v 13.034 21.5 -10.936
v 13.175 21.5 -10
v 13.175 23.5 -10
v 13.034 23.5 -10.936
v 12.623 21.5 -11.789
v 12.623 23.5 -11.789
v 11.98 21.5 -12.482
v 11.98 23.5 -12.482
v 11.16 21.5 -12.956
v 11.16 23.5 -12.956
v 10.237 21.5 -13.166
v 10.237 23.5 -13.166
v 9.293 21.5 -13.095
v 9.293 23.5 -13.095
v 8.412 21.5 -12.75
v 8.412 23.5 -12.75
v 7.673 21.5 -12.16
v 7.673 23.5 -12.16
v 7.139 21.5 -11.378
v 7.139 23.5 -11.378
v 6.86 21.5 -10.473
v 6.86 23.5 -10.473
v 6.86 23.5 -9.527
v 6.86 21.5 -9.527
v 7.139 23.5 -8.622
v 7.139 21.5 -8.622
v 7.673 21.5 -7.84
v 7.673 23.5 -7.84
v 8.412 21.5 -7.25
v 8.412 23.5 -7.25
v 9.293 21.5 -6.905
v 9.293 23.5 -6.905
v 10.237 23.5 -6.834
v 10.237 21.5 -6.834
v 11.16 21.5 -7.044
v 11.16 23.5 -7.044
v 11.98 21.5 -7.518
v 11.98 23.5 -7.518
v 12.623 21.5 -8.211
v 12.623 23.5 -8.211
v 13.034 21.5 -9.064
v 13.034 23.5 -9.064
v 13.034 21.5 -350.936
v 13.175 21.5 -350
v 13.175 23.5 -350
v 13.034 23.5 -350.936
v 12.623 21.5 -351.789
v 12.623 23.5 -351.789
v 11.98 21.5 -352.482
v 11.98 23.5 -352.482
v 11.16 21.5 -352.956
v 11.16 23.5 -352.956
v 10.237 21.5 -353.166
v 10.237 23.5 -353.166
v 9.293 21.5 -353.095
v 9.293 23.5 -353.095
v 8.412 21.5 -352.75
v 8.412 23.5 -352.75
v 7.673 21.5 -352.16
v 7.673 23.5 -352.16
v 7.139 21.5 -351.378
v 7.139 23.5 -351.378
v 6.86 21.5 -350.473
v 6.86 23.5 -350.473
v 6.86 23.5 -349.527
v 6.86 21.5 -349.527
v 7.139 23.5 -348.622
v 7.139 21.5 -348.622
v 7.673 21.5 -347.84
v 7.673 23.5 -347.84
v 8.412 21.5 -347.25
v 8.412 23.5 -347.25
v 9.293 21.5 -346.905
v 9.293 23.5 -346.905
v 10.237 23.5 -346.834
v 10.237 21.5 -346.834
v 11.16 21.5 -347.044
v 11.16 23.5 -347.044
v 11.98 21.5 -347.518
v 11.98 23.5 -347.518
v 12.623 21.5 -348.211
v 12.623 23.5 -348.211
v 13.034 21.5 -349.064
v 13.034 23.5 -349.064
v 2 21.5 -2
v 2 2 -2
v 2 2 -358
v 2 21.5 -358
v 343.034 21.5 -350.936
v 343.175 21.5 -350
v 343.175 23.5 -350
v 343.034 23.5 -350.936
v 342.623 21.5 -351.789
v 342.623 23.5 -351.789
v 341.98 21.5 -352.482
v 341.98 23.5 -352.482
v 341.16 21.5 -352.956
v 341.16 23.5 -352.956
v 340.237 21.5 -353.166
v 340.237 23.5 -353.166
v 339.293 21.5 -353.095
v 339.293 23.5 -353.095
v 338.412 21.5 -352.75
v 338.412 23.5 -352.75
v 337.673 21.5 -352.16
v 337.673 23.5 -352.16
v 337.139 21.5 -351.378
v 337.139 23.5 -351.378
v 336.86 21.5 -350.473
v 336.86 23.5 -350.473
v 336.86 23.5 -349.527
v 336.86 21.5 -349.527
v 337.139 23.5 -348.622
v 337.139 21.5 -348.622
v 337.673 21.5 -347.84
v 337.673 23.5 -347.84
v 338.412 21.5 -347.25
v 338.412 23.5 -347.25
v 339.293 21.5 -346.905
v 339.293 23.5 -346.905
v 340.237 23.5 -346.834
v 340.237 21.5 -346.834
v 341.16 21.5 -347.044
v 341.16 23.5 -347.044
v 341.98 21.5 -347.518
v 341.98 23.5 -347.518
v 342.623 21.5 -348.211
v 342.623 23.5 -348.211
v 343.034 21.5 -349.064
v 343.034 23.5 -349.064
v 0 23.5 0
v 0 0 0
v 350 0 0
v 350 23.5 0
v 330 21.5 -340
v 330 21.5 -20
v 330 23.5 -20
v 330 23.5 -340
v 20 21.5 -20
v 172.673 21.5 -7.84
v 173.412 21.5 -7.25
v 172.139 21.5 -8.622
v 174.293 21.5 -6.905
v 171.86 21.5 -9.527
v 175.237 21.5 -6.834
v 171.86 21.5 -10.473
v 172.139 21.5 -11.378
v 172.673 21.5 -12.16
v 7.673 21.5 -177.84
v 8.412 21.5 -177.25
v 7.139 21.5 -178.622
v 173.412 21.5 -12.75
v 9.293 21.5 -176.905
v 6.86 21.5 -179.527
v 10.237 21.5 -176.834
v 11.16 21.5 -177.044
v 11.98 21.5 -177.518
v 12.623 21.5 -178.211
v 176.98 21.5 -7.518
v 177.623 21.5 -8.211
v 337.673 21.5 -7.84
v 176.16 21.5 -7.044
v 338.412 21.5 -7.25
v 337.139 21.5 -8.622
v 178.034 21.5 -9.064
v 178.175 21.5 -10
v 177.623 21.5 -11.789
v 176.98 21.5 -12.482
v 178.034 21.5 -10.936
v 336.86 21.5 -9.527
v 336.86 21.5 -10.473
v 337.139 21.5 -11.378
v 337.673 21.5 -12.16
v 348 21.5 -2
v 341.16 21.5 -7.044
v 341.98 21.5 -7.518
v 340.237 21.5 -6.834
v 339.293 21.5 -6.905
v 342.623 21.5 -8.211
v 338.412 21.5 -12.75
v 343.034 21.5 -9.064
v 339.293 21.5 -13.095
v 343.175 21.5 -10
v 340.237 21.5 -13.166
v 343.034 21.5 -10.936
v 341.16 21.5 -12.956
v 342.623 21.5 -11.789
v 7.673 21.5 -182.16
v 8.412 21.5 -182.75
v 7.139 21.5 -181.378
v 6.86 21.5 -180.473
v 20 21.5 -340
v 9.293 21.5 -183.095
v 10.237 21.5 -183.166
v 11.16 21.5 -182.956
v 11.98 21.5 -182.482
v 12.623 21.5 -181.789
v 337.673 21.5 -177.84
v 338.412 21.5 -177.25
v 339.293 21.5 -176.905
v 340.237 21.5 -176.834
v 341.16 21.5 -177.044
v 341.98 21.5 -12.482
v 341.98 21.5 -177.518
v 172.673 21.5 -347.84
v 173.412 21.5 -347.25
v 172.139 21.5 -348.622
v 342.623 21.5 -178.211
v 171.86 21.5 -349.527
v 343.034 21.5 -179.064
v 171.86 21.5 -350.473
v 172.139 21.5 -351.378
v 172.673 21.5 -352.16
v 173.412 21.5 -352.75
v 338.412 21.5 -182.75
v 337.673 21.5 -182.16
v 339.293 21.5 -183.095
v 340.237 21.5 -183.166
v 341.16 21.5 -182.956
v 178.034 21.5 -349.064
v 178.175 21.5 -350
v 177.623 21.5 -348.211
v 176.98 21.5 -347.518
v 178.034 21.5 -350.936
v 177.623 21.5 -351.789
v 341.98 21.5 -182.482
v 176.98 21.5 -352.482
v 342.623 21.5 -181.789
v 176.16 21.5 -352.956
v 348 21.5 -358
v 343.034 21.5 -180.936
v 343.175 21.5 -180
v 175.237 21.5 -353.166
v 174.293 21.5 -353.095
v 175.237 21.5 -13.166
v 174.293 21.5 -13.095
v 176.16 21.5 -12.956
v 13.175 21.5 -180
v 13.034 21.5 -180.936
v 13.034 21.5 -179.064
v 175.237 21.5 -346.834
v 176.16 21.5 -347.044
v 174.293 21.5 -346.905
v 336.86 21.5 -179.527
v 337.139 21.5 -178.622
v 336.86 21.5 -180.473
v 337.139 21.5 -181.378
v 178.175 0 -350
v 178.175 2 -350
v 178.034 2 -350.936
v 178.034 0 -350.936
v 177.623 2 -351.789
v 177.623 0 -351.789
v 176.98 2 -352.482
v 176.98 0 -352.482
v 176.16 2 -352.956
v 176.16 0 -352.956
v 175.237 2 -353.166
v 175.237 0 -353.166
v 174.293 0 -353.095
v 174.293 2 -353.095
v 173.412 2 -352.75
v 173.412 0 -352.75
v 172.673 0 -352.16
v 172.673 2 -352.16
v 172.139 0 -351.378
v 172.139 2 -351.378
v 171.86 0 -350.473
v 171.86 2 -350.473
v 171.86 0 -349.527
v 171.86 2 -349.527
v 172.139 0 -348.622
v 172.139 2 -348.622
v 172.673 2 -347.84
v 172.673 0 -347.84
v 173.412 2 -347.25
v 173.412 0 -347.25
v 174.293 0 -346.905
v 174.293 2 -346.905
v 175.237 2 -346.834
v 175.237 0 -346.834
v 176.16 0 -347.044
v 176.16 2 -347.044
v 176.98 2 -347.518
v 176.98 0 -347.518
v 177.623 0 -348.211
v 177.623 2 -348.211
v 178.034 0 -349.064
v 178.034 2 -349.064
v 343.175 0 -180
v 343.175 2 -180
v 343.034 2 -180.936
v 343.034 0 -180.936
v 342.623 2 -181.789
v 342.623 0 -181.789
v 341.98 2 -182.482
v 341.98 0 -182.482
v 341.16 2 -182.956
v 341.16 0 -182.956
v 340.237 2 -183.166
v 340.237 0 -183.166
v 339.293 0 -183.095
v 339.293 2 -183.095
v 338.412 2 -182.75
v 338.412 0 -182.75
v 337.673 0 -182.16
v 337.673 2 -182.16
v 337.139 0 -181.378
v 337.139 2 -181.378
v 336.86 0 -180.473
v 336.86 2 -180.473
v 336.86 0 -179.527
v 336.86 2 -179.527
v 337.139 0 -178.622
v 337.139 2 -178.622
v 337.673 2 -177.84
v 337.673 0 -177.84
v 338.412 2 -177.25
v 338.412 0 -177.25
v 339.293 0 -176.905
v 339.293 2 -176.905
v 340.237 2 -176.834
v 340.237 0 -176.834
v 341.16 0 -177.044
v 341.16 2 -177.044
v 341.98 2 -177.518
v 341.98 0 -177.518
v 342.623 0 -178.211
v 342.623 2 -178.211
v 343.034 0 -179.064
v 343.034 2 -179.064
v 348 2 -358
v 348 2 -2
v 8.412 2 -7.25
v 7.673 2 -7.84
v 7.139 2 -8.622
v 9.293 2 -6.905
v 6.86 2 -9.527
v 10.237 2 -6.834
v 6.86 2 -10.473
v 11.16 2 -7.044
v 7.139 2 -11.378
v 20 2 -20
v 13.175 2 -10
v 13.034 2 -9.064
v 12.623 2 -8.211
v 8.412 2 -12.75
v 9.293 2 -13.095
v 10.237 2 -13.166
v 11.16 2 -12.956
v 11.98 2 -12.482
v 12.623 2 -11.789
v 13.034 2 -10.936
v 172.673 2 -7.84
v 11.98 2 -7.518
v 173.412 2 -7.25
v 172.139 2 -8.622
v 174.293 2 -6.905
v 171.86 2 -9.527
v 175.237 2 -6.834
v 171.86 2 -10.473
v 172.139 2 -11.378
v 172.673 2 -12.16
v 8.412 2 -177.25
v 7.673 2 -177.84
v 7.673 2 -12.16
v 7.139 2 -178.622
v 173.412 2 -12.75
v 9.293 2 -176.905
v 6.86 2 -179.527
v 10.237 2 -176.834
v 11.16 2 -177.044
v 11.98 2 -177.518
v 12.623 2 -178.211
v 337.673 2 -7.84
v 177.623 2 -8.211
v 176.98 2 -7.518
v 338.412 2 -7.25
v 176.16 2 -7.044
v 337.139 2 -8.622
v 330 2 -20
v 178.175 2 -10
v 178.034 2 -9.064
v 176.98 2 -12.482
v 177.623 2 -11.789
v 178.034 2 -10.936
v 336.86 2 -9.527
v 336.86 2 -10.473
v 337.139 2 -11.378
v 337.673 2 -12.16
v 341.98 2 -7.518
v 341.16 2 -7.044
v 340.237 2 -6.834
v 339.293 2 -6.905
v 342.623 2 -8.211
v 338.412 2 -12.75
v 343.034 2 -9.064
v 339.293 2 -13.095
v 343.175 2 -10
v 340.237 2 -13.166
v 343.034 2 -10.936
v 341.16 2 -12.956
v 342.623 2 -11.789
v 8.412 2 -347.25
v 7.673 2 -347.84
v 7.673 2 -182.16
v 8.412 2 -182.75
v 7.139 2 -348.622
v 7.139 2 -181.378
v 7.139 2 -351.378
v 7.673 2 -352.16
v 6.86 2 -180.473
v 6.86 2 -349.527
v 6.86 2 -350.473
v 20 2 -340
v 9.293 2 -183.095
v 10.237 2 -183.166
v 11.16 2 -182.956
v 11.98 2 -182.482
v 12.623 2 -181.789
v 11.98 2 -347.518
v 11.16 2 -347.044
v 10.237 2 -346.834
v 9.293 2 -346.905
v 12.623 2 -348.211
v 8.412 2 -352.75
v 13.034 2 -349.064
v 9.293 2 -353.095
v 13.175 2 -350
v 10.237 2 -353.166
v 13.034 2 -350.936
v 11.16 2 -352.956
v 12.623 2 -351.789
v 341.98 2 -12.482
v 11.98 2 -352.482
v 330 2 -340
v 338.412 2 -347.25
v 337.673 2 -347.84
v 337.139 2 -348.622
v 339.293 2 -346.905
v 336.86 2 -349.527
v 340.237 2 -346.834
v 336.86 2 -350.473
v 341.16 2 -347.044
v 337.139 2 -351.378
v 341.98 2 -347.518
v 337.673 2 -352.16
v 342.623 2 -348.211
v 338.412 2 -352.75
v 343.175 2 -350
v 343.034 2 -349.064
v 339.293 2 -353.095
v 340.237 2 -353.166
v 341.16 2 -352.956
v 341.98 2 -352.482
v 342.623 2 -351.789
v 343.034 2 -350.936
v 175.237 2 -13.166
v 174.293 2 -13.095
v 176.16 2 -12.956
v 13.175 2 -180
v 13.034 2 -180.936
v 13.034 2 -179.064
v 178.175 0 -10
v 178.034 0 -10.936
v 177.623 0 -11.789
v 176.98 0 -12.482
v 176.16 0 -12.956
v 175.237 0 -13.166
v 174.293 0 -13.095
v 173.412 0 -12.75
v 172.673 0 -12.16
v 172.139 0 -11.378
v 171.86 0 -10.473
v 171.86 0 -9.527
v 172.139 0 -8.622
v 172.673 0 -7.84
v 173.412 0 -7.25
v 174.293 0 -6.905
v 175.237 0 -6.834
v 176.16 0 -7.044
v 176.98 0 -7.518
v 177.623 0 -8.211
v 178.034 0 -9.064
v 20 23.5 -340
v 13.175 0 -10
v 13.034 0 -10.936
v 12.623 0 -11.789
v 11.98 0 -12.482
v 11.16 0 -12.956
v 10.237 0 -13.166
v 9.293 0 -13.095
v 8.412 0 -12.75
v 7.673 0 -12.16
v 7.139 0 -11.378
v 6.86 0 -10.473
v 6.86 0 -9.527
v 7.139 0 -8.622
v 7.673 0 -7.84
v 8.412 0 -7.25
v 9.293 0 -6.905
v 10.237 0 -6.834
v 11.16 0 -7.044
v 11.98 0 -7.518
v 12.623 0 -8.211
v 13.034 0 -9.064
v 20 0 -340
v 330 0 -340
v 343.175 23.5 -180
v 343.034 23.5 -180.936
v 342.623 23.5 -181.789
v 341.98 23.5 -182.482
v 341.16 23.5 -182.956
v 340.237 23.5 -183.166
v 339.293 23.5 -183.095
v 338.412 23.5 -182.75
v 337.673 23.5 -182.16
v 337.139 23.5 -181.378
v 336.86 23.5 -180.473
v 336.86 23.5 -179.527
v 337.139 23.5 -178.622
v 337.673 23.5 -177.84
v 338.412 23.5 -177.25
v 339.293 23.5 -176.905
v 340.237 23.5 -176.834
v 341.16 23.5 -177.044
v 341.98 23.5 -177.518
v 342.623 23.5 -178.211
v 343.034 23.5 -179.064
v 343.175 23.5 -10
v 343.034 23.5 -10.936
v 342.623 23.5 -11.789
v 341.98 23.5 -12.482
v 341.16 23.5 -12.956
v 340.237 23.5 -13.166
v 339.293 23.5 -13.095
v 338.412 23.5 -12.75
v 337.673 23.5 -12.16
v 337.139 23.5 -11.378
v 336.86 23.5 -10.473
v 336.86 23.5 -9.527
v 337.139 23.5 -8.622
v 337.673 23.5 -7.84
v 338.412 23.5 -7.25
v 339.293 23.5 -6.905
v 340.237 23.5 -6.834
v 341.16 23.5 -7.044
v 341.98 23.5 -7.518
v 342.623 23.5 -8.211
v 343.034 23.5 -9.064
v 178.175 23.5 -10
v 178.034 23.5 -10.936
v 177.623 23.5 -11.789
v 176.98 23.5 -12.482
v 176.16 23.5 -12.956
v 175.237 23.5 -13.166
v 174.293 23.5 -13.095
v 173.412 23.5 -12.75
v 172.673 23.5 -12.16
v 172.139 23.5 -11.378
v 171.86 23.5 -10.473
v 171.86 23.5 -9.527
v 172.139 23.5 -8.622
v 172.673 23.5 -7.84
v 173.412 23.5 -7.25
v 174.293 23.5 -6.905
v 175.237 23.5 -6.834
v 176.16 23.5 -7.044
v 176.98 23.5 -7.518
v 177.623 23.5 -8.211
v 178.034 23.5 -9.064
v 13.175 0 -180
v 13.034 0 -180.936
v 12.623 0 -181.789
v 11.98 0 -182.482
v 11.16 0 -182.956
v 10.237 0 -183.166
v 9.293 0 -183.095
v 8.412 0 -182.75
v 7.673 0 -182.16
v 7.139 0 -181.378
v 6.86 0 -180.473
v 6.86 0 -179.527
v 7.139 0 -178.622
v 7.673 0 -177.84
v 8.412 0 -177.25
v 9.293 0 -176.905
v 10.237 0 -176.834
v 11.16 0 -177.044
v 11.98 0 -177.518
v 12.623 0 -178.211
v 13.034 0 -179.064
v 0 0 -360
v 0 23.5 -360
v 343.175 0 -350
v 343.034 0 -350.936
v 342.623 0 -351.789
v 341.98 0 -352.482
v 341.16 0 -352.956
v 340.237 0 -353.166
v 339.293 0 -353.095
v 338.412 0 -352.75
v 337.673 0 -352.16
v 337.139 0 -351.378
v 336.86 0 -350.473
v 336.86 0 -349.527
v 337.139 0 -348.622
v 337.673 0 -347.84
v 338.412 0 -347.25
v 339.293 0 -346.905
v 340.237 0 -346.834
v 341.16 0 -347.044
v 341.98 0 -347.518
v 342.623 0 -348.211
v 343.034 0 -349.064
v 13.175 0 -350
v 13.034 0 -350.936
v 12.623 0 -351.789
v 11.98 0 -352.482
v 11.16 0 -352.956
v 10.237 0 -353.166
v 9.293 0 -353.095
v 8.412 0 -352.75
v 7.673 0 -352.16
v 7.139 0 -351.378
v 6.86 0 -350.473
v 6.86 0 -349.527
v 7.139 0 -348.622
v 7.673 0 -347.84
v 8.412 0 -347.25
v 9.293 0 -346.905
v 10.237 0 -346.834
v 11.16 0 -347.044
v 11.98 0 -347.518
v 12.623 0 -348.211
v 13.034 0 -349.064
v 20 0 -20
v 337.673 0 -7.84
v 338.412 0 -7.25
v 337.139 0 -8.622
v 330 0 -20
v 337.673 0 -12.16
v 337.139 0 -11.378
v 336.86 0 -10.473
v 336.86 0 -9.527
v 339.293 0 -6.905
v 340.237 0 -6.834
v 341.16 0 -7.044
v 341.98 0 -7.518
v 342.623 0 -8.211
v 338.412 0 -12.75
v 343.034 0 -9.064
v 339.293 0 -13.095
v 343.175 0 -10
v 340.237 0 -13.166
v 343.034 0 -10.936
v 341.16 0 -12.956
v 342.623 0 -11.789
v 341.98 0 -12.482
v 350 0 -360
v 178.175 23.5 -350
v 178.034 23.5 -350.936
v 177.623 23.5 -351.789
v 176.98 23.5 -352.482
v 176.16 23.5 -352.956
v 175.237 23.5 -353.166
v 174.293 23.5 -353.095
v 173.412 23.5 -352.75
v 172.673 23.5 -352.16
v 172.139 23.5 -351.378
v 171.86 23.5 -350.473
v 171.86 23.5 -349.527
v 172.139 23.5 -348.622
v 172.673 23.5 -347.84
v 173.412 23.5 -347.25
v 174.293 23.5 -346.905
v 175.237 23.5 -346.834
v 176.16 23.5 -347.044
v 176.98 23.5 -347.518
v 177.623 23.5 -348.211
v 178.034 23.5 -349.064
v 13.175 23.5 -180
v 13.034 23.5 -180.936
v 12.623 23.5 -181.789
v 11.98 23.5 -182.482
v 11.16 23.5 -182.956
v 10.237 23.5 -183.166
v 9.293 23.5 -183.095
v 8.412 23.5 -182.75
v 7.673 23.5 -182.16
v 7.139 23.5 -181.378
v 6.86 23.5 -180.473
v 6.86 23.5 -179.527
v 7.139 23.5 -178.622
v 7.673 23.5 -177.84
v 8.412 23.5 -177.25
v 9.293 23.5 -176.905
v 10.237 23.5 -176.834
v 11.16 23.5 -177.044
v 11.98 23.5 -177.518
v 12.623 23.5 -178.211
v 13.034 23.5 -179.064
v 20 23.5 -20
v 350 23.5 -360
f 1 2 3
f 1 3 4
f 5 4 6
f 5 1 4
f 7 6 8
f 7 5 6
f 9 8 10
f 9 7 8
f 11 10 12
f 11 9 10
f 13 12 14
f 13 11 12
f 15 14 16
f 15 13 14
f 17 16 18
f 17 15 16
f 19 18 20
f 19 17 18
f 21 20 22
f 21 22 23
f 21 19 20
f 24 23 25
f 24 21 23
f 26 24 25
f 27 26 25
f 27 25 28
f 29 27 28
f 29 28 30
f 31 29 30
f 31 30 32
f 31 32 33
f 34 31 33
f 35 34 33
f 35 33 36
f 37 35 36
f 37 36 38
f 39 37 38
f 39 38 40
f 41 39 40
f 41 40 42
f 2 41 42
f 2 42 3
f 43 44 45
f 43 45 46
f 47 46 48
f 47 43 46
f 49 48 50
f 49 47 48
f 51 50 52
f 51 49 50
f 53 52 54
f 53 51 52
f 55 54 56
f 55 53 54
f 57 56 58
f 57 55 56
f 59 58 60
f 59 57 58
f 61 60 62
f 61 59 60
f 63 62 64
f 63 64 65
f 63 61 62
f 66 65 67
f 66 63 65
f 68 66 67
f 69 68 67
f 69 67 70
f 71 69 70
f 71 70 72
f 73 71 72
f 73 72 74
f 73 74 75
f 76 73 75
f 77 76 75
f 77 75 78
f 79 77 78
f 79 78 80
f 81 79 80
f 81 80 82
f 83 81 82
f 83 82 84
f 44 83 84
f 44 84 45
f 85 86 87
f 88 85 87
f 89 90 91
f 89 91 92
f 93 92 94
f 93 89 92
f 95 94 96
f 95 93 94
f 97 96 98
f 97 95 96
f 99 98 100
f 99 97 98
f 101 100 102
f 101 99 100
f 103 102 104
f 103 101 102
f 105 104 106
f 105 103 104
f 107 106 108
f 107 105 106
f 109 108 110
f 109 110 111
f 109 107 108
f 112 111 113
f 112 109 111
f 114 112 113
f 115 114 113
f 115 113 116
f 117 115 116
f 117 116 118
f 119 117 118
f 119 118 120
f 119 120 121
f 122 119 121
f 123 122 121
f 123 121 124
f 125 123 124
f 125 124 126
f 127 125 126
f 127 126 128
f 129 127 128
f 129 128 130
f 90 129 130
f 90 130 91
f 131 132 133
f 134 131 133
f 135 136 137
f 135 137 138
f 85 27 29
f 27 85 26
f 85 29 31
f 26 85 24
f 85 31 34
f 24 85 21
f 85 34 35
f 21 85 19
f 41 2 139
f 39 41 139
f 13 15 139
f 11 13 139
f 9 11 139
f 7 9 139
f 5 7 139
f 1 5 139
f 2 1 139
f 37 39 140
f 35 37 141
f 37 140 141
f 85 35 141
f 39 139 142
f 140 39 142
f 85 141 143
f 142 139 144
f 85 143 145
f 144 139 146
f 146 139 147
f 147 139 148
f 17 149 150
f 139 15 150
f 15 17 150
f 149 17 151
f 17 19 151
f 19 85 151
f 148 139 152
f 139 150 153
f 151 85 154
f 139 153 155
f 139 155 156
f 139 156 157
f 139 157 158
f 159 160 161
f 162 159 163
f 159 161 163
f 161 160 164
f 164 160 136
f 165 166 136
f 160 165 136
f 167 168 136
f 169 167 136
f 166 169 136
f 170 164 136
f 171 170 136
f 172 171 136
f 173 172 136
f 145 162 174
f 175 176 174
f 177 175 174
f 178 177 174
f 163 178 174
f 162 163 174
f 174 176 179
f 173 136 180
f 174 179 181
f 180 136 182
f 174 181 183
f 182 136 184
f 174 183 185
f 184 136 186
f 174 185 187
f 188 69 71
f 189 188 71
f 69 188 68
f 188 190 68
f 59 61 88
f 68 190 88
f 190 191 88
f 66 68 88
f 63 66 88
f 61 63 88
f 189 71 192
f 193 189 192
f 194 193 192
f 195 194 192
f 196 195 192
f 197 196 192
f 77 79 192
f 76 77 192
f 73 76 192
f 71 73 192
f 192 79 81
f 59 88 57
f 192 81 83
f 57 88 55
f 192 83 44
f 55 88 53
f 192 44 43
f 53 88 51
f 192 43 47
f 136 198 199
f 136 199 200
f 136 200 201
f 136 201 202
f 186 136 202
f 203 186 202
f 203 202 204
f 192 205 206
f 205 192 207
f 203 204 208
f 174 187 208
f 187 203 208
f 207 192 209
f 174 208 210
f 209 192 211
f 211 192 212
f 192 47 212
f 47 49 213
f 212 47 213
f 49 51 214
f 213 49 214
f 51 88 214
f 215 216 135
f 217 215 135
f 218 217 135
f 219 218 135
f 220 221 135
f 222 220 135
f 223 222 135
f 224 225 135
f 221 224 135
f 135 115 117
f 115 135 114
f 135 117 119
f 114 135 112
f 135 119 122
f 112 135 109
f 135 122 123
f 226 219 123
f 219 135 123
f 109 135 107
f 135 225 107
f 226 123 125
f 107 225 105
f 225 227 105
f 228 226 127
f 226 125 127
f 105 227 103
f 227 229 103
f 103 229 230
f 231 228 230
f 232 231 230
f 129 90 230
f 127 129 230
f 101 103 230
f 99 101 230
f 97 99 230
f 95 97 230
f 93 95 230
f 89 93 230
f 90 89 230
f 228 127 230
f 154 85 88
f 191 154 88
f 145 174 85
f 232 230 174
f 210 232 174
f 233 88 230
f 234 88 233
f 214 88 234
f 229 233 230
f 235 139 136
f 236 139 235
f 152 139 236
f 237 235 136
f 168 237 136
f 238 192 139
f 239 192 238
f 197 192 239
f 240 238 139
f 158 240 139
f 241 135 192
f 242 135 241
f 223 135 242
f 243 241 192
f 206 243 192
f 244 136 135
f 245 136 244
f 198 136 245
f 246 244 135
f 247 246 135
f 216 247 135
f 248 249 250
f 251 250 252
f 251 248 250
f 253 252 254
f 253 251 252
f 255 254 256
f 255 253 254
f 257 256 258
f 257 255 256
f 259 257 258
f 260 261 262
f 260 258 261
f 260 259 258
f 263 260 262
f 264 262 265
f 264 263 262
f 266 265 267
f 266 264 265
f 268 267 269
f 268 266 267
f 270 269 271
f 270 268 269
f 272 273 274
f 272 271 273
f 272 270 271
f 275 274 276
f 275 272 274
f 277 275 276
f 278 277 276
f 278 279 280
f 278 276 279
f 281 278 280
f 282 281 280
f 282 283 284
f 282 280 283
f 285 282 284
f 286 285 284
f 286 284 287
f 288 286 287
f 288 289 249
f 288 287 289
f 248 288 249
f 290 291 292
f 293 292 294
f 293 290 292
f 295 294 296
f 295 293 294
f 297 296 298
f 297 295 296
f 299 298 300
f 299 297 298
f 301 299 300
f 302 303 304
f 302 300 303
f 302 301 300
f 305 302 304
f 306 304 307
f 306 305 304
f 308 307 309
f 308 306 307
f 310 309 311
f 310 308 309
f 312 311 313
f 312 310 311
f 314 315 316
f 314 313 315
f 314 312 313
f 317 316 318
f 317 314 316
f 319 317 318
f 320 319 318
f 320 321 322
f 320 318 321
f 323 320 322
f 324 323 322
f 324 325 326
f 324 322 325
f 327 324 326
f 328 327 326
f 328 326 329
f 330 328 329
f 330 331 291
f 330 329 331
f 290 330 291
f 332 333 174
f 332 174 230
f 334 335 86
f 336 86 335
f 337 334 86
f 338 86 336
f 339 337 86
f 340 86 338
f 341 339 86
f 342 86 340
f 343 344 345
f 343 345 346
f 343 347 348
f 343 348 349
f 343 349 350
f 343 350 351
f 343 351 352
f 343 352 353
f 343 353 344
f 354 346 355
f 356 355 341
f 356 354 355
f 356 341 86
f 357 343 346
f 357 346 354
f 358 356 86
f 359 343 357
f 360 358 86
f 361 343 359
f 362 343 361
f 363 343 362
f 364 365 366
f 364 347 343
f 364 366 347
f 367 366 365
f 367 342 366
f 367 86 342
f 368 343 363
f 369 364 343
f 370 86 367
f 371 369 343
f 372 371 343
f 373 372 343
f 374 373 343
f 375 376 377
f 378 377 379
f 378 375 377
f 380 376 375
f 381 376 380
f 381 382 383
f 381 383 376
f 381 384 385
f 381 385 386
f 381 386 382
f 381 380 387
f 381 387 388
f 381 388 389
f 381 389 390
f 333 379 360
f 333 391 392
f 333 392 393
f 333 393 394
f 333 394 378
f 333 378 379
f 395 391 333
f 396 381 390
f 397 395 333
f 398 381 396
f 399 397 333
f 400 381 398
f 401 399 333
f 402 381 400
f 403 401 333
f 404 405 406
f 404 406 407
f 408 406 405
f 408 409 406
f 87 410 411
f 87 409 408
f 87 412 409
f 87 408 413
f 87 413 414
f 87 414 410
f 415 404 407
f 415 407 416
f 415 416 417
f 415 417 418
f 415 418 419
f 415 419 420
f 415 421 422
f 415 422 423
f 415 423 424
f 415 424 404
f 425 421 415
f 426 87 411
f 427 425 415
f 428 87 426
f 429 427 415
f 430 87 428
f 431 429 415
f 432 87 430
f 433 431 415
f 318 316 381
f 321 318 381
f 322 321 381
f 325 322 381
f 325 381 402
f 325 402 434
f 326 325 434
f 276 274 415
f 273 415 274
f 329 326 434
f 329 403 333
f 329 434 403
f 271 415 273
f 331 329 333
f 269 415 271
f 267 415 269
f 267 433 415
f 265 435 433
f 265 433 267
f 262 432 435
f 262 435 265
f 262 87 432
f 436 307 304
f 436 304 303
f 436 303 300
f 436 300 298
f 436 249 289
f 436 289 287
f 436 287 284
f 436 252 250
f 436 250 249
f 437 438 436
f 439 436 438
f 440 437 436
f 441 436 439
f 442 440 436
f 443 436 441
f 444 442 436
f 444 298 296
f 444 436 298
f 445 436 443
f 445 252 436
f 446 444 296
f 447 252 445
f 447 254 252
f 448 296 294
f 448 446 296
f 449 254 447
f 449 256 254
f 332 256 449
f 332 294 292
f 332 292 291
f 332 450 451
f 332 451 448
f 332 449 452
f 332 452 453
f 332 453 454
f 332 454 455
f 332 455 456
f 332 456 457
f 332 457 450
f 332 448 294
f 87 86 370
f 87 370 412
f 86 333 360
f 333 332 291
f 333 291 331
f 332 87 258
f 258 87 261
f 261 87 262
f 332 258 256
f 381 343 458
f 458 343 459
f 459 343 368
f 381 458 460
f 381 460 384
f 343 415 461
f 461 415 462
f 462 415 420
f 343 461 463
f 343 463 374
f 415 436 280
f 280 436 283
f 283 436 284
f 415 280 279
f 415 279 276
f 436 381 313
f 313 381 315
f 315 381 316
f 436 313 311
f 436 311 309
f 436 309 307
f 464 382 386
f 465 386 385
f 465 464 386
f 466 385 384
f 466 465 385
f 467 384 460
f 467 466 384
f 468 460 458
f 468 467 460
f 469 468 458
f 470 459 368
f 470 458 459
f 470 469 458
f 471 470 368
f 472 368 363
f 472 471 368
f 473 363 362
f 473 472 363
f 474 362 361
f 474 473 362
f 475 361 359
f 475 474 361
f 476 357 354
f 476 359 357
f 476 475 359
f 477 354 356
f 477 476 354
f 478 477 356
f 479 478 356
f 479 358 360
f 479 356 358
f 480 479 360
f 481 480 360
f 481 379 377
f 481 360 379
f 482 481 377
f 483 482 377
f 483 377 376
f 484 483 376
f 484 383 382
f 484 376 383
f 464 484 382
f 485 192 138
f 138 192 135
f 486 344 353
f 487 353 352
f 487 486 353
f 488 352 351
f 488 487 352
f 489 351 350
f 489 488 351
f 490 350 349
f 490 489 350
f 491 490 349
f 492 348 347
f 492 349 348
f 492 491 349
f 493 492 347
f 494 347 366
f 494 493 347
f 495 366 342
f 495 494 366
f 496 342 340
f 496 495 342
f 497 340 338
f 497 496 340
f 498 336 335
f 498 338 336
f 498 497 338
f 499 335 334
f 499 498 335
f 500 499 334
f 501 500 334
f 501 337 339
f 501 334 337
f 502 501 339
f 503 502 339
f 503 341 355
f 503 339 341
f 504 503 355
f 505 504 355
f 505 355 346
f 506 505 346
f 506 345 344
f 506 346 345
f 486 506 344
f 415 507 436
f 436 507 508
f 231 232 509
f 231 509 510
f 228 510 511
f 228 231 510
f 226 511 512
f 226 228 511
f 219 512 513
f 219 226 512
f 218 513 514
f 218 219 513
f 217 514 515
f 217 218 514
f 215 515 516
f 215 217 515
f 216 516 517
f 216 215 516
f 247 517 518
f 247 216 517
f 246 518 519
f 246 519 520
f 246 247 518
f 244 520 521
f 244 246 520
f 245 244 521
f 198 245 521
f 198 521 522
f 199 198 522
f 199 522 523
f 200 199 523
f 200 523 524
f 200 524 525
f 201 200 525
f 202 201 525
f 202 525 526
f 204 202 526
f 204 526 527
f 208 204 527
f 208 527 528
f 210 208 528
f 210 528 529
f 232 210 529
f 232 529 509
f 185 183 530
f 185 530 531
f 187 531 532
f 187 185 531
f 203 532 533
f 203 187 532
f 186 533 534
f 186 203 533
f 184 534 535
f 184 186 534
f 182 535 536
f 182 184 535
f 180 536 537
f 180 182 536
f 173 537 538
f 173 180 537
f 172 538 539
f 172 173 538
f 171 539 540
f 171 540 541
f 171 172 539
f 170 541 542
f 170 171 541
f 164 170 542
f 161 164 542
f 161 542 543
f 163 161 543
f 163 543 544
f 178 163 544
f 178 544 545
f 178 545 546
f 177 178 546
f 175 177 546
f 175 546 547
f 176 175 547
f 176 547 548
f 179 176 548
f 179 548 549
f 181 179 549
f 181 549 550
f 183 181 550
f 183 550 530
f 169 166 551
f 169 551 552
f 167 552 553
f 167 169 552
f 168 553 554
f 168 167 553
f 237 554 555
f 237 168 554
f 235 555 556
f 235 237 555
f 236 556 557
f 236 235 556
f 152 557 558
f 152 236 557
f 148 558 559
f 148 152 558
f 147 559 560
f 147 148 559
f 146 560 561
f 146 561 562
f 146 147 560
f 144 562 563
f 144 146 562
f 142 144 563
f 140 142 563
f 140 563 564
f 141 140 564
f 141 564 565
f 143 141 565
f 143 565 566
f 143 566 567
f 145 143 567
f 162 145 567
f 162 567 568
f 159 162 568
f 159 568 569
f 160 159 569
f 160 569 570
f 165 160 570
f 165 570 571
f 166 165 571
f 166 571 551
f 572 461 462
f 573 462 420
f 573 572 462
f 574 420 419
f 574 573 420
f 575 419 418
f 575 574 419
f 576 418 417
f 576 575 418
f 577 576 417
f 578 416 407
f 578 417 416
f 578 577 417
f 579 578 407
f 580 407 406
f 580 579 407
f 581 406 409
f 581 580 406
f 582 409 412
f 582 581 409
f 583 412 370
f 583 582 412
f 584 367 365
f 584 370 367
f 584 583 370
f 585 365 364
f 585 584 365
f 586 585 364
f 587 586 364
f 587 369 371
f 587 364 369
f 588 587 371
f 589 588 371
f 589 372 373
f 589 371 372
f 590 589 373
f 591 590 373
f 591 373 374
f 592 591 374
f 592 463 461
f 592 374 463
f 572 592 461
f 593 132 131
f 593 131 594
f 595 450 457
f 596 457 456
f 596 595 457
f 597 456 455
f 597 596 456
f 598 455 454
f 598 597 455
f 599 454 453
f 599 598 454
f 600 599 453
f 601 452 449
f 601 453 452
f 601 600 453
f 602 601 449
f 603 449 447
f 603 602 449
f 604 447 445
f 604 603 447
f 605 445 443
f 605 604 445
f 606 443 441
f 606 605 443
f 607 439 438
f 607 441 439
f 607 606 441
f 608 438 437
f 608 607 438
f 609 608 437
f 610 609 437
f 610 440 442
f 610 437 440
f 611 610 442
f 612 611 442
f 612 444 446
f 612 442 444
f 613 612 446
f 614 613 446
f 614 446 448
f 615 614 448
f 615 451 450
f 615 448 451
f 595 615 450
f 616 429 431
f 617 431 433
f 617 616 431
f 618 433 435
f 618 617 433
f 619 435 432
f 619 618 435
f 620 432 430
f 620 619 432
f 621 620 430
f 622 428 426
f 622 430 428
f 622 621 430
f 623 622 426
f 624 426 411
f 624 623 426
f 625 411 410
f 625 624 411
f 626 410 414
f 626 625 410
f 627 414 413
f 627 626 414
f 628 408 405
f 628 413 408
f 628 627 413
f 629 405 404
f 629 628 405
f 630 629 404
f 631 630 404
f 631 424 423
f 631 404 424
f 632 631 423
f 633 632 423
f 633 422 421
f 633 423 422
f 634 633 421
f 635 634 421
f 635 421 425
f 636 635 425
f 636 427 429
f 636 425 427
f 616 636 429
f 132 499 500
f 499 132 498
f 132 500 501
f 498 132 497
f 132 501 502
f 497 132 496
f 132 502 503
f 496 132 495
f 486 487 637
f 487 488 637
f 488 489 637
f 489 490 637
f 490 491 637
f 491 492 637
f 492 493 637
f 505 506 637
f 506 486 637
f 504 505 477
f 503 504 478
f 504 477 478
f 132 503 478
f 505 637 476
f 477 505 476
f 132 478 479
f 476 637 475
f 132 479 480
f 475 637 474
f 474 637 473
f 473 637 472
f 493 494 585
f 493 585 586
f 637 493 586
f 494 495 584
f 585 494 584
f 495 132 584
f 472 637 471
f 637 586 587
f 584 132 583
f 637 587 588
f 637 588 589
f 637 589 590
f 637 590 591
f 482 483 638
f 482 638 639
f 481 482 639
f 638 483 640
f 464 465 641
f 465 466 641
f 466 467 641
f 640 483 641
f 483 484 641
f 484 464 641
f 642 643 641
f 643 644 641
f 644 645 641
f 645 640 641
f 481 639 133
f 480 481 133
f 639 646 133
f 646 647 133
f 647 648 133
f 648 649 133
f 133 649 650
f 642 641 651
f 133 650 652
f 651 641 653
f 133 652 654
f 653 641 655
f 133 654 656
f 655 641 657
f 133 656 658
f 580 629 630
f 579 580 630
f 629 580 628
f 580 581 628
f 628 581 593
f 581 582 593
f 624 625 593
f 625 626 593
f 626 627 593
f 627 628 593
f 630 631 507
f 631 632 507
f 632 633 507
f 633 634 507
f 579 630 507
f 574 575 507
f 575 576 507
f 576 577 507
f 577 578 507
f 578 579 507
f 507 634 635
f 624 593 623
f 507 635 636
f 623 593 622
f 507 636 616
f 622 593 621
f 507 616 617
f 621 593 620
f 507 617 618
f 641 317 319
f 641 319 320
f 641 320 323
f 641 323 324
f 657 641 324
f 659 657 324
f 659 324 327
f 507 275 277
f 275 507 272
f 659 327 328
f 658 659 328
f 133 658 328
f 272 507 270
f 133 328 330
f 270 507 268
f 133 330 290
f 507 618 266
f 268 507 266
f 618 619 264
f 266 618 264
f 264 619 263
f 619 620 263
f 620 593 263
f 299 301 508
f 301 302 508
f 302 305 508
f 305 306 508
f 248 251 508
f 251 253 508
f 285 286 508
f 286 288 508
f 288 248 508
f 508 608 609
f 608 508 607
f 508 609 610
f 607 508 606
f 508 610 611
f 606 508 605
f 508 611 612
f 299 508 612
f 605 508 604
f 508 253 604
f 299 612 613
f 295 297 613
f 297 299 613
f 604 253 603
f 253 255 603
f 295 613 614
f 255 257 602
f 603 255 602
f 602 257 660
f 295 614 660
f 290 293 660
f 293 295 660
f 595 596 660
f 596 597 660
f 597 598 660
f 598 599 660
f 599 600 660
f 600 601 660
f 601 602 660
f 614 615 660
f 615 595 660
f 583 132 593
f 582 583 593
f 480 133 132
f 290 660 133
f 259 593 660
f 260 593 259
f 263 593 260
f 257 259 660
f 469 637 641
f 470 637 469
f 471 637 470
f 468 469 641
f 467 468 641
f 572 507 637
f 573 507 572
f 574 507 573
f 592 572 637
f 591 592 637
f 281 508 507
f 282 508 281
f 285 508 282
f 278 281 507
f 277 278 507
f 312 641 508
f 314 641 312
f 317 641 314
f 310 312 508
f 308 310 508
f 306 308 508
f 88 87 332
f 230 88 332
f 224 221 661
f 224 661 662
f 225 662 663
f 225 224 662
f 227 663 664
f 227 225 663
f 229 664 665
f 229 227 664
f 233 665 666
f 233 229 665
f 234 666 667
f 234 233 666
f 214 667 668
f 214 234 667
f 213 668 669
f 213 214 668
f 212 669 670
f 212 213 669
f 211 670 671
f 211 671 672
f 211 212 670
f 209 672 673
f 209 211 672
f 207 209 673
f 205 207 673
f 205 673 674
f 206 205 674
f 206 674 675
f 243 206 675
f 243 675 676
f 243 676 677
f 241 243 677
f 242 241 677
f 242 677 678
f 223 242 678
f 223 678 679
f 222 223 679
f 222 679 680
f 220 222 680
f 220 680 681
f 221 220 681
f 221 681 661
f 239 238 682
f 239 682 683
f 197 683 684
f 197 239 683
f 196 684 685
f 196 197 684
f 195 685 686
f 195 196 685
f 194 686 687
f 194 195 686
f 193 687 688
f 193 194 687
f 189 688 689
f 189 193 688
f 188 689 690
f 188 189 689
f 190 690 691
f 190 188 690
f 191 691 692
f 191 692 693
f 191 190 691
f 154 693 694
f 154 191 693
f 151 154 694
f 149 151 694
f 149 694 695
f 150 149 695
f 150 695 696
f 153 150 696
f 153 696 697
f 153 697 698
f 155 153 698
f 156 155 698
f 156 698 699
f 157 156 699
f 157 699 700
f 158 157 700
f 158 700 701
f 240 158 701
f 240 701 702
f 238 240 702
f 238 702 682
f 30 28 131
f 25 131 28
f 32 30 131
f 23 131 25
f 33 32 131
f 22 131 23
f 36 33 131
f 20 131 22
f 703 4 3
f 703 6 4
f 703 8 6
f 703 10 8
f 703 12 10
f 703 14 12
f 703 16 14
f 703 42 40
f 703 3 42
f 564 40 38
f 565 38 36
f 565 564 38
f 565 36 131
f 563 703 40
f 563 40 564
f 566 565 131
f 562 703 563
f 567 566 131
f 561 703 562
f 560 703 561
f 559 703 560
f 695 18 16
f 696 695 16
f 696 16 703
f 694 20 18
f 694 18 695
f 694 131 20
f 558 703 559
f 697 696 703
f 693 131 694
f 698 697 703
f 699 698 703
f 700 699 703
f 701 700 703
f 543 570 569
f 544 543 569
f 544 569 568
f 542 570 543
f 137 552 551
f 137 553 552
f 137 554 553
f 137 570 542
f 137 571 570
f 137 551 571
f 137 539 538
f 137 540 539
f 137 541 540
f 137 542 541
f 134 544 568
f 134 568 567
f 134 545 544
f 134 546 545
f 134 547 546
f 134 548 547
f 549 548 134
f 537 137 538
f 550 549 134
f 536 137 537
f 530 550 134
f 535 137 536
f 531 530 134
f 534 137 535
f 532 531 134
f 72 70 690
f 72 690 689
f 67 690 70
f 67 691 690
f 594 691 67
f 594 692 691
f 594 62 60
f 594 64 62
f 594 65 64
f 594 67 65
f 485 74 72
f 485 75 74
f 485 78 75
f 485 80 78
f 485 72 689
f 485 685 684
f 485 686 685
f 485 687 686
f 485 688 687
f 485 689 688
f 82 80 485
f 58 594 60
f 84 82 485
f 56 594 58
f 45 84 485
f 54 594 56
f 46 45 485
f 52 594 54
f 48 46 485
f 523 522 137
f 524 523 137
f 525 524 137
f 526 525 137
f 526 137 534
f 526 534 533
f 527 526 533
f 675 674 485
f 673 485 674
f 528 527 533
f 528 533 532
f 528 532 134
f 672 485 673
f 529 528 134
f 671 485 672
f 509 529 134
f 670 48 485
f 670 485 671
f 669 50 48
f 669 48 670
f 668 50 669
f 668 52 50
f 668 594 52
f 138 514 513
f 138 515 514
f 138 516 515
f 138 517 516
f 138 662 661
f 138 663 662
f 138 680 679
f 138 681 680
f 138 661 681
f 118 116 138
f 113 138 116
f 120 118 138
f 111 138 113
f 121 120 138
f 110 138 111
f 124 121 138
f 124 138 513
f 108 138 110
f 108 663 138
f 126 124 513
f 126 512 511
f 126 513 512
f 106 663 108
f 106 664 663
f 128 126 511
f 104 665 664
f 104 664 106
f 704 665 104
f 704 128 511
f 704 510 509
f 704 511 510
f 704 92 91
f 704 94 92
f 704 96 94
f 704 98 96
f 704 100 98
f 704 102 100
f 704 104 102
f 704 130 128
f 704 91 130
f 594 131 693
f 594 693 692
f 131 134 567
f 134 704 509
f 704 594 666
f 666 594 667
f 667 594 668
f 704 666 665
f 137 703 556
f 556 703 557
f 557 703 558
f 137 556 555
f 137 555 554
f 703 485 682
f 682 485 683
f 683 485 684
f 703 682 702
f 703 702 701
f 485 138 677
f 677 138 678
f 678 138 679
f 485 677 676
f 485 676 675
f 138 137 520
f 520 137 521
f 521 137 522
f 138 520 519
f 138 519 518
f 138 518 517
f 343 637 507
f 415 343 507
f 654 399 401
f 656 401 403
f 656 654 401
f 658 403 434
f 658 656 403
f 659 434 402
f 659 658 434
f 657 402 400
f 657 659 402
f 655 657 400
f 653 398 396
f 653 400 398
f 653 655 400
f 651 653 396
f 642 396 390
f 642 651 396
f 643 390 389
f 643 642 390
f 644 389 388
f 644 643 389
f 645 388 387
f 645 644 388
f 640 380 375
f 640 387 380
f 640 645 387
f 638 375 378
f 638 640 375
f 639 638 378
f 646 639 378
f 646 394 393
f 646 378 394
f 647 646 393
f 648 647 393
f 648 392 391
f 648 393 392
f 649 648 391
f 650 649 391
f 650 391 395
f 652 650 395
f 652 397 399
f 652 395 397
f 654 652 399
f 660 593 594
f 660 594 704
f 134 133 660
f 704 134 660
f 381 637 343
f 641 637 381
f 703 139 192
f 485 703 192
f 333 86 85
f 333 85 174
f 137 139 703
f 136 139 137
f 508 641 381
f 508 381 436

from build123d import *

# Parameters (mm, degrees)
ESQUISSE1_W             = 350
ESQUISSE1_H             = 360
ESQUISSE1_R             = 3.175
ESQUISSE1_W_2           = 310
ESQUISSE1_H_2           = 320
BOSS_EXTRU_2_DEPTH      = 23.5
ENL_V_START             = 2
ESQUISSE1_4_W           = 346
ESQUISSE1_4_H           = 356
ENL_V_MAT_EXTRU_1_DEPTH = 19.5


with BuildPart() as part:
    # Esquisse1 → Boss.-Extru.2 (new body)
    with BuildSketch(Plane(origin=(0, 0, 0), x_dir=(1, 0, 0), z_dir=(0, 1, 0))):
        with Locations((175, 180)):
            Rectangle(ESQUISSE1_W, ESQUISSE1_H)
        with Locations((10, 10)):
            Circle(ESQUISSE1_R, mode=Mode.SUBTRACT)
        with Locations((175, 10)):
            Circle(ESQUISSE1_R, mode=Mode.SUBTRACT)
        with Locations((340, 10)):
            Circle(ESQUISSE1_R, mode=Mode.SUBTRACT)
        with Locations((340, 180)):
            Circle(ESQUISSE1_R, mode=Mode.SUBTRACT)
        with Locations((10, 180)):
            Circle(ESQUISSE1_R, mode=Mode.SUBTRACT)
        with Locations((340, 350)):
            Circle(ESQUISSE1_R, mode=Mode.SUBTRACT)
        with Locations((175, 350)):
            Circle(ESQUISSE1_R, mode=Mode.SUBTRACT)
        with Locations((10, 350)):
            Circle(ESQUISSE1_R, mode=Mode.SUBTRACT)
        with Locations((175, 180)):
            Rectangle(ESQUISSE1_W_2, ESQUISSE1_H_2, mode=Mode.SUBTRACT)
    extrude(amount=BOSS_EXTRU_2_DEPTH)

    # Esquisse1_4 → Enl_v. mat.-Extru.1 (cut)
    with BuildSketch(Plane(origin=(0, 0, 0), x_dir=(1, 0, 0), z_dir=(0, 1, 0)).offset(ENL_V_START)):
        with Locations((175, 180)):
            Rectangle(ESQUISSE1_4_W, ESQUISSE1_4_H)
    extrude(amount=ENL_V_MAT_EXTRU_1_DEPTH, mode=Mode.SUBTRACT)


solid = part.part
